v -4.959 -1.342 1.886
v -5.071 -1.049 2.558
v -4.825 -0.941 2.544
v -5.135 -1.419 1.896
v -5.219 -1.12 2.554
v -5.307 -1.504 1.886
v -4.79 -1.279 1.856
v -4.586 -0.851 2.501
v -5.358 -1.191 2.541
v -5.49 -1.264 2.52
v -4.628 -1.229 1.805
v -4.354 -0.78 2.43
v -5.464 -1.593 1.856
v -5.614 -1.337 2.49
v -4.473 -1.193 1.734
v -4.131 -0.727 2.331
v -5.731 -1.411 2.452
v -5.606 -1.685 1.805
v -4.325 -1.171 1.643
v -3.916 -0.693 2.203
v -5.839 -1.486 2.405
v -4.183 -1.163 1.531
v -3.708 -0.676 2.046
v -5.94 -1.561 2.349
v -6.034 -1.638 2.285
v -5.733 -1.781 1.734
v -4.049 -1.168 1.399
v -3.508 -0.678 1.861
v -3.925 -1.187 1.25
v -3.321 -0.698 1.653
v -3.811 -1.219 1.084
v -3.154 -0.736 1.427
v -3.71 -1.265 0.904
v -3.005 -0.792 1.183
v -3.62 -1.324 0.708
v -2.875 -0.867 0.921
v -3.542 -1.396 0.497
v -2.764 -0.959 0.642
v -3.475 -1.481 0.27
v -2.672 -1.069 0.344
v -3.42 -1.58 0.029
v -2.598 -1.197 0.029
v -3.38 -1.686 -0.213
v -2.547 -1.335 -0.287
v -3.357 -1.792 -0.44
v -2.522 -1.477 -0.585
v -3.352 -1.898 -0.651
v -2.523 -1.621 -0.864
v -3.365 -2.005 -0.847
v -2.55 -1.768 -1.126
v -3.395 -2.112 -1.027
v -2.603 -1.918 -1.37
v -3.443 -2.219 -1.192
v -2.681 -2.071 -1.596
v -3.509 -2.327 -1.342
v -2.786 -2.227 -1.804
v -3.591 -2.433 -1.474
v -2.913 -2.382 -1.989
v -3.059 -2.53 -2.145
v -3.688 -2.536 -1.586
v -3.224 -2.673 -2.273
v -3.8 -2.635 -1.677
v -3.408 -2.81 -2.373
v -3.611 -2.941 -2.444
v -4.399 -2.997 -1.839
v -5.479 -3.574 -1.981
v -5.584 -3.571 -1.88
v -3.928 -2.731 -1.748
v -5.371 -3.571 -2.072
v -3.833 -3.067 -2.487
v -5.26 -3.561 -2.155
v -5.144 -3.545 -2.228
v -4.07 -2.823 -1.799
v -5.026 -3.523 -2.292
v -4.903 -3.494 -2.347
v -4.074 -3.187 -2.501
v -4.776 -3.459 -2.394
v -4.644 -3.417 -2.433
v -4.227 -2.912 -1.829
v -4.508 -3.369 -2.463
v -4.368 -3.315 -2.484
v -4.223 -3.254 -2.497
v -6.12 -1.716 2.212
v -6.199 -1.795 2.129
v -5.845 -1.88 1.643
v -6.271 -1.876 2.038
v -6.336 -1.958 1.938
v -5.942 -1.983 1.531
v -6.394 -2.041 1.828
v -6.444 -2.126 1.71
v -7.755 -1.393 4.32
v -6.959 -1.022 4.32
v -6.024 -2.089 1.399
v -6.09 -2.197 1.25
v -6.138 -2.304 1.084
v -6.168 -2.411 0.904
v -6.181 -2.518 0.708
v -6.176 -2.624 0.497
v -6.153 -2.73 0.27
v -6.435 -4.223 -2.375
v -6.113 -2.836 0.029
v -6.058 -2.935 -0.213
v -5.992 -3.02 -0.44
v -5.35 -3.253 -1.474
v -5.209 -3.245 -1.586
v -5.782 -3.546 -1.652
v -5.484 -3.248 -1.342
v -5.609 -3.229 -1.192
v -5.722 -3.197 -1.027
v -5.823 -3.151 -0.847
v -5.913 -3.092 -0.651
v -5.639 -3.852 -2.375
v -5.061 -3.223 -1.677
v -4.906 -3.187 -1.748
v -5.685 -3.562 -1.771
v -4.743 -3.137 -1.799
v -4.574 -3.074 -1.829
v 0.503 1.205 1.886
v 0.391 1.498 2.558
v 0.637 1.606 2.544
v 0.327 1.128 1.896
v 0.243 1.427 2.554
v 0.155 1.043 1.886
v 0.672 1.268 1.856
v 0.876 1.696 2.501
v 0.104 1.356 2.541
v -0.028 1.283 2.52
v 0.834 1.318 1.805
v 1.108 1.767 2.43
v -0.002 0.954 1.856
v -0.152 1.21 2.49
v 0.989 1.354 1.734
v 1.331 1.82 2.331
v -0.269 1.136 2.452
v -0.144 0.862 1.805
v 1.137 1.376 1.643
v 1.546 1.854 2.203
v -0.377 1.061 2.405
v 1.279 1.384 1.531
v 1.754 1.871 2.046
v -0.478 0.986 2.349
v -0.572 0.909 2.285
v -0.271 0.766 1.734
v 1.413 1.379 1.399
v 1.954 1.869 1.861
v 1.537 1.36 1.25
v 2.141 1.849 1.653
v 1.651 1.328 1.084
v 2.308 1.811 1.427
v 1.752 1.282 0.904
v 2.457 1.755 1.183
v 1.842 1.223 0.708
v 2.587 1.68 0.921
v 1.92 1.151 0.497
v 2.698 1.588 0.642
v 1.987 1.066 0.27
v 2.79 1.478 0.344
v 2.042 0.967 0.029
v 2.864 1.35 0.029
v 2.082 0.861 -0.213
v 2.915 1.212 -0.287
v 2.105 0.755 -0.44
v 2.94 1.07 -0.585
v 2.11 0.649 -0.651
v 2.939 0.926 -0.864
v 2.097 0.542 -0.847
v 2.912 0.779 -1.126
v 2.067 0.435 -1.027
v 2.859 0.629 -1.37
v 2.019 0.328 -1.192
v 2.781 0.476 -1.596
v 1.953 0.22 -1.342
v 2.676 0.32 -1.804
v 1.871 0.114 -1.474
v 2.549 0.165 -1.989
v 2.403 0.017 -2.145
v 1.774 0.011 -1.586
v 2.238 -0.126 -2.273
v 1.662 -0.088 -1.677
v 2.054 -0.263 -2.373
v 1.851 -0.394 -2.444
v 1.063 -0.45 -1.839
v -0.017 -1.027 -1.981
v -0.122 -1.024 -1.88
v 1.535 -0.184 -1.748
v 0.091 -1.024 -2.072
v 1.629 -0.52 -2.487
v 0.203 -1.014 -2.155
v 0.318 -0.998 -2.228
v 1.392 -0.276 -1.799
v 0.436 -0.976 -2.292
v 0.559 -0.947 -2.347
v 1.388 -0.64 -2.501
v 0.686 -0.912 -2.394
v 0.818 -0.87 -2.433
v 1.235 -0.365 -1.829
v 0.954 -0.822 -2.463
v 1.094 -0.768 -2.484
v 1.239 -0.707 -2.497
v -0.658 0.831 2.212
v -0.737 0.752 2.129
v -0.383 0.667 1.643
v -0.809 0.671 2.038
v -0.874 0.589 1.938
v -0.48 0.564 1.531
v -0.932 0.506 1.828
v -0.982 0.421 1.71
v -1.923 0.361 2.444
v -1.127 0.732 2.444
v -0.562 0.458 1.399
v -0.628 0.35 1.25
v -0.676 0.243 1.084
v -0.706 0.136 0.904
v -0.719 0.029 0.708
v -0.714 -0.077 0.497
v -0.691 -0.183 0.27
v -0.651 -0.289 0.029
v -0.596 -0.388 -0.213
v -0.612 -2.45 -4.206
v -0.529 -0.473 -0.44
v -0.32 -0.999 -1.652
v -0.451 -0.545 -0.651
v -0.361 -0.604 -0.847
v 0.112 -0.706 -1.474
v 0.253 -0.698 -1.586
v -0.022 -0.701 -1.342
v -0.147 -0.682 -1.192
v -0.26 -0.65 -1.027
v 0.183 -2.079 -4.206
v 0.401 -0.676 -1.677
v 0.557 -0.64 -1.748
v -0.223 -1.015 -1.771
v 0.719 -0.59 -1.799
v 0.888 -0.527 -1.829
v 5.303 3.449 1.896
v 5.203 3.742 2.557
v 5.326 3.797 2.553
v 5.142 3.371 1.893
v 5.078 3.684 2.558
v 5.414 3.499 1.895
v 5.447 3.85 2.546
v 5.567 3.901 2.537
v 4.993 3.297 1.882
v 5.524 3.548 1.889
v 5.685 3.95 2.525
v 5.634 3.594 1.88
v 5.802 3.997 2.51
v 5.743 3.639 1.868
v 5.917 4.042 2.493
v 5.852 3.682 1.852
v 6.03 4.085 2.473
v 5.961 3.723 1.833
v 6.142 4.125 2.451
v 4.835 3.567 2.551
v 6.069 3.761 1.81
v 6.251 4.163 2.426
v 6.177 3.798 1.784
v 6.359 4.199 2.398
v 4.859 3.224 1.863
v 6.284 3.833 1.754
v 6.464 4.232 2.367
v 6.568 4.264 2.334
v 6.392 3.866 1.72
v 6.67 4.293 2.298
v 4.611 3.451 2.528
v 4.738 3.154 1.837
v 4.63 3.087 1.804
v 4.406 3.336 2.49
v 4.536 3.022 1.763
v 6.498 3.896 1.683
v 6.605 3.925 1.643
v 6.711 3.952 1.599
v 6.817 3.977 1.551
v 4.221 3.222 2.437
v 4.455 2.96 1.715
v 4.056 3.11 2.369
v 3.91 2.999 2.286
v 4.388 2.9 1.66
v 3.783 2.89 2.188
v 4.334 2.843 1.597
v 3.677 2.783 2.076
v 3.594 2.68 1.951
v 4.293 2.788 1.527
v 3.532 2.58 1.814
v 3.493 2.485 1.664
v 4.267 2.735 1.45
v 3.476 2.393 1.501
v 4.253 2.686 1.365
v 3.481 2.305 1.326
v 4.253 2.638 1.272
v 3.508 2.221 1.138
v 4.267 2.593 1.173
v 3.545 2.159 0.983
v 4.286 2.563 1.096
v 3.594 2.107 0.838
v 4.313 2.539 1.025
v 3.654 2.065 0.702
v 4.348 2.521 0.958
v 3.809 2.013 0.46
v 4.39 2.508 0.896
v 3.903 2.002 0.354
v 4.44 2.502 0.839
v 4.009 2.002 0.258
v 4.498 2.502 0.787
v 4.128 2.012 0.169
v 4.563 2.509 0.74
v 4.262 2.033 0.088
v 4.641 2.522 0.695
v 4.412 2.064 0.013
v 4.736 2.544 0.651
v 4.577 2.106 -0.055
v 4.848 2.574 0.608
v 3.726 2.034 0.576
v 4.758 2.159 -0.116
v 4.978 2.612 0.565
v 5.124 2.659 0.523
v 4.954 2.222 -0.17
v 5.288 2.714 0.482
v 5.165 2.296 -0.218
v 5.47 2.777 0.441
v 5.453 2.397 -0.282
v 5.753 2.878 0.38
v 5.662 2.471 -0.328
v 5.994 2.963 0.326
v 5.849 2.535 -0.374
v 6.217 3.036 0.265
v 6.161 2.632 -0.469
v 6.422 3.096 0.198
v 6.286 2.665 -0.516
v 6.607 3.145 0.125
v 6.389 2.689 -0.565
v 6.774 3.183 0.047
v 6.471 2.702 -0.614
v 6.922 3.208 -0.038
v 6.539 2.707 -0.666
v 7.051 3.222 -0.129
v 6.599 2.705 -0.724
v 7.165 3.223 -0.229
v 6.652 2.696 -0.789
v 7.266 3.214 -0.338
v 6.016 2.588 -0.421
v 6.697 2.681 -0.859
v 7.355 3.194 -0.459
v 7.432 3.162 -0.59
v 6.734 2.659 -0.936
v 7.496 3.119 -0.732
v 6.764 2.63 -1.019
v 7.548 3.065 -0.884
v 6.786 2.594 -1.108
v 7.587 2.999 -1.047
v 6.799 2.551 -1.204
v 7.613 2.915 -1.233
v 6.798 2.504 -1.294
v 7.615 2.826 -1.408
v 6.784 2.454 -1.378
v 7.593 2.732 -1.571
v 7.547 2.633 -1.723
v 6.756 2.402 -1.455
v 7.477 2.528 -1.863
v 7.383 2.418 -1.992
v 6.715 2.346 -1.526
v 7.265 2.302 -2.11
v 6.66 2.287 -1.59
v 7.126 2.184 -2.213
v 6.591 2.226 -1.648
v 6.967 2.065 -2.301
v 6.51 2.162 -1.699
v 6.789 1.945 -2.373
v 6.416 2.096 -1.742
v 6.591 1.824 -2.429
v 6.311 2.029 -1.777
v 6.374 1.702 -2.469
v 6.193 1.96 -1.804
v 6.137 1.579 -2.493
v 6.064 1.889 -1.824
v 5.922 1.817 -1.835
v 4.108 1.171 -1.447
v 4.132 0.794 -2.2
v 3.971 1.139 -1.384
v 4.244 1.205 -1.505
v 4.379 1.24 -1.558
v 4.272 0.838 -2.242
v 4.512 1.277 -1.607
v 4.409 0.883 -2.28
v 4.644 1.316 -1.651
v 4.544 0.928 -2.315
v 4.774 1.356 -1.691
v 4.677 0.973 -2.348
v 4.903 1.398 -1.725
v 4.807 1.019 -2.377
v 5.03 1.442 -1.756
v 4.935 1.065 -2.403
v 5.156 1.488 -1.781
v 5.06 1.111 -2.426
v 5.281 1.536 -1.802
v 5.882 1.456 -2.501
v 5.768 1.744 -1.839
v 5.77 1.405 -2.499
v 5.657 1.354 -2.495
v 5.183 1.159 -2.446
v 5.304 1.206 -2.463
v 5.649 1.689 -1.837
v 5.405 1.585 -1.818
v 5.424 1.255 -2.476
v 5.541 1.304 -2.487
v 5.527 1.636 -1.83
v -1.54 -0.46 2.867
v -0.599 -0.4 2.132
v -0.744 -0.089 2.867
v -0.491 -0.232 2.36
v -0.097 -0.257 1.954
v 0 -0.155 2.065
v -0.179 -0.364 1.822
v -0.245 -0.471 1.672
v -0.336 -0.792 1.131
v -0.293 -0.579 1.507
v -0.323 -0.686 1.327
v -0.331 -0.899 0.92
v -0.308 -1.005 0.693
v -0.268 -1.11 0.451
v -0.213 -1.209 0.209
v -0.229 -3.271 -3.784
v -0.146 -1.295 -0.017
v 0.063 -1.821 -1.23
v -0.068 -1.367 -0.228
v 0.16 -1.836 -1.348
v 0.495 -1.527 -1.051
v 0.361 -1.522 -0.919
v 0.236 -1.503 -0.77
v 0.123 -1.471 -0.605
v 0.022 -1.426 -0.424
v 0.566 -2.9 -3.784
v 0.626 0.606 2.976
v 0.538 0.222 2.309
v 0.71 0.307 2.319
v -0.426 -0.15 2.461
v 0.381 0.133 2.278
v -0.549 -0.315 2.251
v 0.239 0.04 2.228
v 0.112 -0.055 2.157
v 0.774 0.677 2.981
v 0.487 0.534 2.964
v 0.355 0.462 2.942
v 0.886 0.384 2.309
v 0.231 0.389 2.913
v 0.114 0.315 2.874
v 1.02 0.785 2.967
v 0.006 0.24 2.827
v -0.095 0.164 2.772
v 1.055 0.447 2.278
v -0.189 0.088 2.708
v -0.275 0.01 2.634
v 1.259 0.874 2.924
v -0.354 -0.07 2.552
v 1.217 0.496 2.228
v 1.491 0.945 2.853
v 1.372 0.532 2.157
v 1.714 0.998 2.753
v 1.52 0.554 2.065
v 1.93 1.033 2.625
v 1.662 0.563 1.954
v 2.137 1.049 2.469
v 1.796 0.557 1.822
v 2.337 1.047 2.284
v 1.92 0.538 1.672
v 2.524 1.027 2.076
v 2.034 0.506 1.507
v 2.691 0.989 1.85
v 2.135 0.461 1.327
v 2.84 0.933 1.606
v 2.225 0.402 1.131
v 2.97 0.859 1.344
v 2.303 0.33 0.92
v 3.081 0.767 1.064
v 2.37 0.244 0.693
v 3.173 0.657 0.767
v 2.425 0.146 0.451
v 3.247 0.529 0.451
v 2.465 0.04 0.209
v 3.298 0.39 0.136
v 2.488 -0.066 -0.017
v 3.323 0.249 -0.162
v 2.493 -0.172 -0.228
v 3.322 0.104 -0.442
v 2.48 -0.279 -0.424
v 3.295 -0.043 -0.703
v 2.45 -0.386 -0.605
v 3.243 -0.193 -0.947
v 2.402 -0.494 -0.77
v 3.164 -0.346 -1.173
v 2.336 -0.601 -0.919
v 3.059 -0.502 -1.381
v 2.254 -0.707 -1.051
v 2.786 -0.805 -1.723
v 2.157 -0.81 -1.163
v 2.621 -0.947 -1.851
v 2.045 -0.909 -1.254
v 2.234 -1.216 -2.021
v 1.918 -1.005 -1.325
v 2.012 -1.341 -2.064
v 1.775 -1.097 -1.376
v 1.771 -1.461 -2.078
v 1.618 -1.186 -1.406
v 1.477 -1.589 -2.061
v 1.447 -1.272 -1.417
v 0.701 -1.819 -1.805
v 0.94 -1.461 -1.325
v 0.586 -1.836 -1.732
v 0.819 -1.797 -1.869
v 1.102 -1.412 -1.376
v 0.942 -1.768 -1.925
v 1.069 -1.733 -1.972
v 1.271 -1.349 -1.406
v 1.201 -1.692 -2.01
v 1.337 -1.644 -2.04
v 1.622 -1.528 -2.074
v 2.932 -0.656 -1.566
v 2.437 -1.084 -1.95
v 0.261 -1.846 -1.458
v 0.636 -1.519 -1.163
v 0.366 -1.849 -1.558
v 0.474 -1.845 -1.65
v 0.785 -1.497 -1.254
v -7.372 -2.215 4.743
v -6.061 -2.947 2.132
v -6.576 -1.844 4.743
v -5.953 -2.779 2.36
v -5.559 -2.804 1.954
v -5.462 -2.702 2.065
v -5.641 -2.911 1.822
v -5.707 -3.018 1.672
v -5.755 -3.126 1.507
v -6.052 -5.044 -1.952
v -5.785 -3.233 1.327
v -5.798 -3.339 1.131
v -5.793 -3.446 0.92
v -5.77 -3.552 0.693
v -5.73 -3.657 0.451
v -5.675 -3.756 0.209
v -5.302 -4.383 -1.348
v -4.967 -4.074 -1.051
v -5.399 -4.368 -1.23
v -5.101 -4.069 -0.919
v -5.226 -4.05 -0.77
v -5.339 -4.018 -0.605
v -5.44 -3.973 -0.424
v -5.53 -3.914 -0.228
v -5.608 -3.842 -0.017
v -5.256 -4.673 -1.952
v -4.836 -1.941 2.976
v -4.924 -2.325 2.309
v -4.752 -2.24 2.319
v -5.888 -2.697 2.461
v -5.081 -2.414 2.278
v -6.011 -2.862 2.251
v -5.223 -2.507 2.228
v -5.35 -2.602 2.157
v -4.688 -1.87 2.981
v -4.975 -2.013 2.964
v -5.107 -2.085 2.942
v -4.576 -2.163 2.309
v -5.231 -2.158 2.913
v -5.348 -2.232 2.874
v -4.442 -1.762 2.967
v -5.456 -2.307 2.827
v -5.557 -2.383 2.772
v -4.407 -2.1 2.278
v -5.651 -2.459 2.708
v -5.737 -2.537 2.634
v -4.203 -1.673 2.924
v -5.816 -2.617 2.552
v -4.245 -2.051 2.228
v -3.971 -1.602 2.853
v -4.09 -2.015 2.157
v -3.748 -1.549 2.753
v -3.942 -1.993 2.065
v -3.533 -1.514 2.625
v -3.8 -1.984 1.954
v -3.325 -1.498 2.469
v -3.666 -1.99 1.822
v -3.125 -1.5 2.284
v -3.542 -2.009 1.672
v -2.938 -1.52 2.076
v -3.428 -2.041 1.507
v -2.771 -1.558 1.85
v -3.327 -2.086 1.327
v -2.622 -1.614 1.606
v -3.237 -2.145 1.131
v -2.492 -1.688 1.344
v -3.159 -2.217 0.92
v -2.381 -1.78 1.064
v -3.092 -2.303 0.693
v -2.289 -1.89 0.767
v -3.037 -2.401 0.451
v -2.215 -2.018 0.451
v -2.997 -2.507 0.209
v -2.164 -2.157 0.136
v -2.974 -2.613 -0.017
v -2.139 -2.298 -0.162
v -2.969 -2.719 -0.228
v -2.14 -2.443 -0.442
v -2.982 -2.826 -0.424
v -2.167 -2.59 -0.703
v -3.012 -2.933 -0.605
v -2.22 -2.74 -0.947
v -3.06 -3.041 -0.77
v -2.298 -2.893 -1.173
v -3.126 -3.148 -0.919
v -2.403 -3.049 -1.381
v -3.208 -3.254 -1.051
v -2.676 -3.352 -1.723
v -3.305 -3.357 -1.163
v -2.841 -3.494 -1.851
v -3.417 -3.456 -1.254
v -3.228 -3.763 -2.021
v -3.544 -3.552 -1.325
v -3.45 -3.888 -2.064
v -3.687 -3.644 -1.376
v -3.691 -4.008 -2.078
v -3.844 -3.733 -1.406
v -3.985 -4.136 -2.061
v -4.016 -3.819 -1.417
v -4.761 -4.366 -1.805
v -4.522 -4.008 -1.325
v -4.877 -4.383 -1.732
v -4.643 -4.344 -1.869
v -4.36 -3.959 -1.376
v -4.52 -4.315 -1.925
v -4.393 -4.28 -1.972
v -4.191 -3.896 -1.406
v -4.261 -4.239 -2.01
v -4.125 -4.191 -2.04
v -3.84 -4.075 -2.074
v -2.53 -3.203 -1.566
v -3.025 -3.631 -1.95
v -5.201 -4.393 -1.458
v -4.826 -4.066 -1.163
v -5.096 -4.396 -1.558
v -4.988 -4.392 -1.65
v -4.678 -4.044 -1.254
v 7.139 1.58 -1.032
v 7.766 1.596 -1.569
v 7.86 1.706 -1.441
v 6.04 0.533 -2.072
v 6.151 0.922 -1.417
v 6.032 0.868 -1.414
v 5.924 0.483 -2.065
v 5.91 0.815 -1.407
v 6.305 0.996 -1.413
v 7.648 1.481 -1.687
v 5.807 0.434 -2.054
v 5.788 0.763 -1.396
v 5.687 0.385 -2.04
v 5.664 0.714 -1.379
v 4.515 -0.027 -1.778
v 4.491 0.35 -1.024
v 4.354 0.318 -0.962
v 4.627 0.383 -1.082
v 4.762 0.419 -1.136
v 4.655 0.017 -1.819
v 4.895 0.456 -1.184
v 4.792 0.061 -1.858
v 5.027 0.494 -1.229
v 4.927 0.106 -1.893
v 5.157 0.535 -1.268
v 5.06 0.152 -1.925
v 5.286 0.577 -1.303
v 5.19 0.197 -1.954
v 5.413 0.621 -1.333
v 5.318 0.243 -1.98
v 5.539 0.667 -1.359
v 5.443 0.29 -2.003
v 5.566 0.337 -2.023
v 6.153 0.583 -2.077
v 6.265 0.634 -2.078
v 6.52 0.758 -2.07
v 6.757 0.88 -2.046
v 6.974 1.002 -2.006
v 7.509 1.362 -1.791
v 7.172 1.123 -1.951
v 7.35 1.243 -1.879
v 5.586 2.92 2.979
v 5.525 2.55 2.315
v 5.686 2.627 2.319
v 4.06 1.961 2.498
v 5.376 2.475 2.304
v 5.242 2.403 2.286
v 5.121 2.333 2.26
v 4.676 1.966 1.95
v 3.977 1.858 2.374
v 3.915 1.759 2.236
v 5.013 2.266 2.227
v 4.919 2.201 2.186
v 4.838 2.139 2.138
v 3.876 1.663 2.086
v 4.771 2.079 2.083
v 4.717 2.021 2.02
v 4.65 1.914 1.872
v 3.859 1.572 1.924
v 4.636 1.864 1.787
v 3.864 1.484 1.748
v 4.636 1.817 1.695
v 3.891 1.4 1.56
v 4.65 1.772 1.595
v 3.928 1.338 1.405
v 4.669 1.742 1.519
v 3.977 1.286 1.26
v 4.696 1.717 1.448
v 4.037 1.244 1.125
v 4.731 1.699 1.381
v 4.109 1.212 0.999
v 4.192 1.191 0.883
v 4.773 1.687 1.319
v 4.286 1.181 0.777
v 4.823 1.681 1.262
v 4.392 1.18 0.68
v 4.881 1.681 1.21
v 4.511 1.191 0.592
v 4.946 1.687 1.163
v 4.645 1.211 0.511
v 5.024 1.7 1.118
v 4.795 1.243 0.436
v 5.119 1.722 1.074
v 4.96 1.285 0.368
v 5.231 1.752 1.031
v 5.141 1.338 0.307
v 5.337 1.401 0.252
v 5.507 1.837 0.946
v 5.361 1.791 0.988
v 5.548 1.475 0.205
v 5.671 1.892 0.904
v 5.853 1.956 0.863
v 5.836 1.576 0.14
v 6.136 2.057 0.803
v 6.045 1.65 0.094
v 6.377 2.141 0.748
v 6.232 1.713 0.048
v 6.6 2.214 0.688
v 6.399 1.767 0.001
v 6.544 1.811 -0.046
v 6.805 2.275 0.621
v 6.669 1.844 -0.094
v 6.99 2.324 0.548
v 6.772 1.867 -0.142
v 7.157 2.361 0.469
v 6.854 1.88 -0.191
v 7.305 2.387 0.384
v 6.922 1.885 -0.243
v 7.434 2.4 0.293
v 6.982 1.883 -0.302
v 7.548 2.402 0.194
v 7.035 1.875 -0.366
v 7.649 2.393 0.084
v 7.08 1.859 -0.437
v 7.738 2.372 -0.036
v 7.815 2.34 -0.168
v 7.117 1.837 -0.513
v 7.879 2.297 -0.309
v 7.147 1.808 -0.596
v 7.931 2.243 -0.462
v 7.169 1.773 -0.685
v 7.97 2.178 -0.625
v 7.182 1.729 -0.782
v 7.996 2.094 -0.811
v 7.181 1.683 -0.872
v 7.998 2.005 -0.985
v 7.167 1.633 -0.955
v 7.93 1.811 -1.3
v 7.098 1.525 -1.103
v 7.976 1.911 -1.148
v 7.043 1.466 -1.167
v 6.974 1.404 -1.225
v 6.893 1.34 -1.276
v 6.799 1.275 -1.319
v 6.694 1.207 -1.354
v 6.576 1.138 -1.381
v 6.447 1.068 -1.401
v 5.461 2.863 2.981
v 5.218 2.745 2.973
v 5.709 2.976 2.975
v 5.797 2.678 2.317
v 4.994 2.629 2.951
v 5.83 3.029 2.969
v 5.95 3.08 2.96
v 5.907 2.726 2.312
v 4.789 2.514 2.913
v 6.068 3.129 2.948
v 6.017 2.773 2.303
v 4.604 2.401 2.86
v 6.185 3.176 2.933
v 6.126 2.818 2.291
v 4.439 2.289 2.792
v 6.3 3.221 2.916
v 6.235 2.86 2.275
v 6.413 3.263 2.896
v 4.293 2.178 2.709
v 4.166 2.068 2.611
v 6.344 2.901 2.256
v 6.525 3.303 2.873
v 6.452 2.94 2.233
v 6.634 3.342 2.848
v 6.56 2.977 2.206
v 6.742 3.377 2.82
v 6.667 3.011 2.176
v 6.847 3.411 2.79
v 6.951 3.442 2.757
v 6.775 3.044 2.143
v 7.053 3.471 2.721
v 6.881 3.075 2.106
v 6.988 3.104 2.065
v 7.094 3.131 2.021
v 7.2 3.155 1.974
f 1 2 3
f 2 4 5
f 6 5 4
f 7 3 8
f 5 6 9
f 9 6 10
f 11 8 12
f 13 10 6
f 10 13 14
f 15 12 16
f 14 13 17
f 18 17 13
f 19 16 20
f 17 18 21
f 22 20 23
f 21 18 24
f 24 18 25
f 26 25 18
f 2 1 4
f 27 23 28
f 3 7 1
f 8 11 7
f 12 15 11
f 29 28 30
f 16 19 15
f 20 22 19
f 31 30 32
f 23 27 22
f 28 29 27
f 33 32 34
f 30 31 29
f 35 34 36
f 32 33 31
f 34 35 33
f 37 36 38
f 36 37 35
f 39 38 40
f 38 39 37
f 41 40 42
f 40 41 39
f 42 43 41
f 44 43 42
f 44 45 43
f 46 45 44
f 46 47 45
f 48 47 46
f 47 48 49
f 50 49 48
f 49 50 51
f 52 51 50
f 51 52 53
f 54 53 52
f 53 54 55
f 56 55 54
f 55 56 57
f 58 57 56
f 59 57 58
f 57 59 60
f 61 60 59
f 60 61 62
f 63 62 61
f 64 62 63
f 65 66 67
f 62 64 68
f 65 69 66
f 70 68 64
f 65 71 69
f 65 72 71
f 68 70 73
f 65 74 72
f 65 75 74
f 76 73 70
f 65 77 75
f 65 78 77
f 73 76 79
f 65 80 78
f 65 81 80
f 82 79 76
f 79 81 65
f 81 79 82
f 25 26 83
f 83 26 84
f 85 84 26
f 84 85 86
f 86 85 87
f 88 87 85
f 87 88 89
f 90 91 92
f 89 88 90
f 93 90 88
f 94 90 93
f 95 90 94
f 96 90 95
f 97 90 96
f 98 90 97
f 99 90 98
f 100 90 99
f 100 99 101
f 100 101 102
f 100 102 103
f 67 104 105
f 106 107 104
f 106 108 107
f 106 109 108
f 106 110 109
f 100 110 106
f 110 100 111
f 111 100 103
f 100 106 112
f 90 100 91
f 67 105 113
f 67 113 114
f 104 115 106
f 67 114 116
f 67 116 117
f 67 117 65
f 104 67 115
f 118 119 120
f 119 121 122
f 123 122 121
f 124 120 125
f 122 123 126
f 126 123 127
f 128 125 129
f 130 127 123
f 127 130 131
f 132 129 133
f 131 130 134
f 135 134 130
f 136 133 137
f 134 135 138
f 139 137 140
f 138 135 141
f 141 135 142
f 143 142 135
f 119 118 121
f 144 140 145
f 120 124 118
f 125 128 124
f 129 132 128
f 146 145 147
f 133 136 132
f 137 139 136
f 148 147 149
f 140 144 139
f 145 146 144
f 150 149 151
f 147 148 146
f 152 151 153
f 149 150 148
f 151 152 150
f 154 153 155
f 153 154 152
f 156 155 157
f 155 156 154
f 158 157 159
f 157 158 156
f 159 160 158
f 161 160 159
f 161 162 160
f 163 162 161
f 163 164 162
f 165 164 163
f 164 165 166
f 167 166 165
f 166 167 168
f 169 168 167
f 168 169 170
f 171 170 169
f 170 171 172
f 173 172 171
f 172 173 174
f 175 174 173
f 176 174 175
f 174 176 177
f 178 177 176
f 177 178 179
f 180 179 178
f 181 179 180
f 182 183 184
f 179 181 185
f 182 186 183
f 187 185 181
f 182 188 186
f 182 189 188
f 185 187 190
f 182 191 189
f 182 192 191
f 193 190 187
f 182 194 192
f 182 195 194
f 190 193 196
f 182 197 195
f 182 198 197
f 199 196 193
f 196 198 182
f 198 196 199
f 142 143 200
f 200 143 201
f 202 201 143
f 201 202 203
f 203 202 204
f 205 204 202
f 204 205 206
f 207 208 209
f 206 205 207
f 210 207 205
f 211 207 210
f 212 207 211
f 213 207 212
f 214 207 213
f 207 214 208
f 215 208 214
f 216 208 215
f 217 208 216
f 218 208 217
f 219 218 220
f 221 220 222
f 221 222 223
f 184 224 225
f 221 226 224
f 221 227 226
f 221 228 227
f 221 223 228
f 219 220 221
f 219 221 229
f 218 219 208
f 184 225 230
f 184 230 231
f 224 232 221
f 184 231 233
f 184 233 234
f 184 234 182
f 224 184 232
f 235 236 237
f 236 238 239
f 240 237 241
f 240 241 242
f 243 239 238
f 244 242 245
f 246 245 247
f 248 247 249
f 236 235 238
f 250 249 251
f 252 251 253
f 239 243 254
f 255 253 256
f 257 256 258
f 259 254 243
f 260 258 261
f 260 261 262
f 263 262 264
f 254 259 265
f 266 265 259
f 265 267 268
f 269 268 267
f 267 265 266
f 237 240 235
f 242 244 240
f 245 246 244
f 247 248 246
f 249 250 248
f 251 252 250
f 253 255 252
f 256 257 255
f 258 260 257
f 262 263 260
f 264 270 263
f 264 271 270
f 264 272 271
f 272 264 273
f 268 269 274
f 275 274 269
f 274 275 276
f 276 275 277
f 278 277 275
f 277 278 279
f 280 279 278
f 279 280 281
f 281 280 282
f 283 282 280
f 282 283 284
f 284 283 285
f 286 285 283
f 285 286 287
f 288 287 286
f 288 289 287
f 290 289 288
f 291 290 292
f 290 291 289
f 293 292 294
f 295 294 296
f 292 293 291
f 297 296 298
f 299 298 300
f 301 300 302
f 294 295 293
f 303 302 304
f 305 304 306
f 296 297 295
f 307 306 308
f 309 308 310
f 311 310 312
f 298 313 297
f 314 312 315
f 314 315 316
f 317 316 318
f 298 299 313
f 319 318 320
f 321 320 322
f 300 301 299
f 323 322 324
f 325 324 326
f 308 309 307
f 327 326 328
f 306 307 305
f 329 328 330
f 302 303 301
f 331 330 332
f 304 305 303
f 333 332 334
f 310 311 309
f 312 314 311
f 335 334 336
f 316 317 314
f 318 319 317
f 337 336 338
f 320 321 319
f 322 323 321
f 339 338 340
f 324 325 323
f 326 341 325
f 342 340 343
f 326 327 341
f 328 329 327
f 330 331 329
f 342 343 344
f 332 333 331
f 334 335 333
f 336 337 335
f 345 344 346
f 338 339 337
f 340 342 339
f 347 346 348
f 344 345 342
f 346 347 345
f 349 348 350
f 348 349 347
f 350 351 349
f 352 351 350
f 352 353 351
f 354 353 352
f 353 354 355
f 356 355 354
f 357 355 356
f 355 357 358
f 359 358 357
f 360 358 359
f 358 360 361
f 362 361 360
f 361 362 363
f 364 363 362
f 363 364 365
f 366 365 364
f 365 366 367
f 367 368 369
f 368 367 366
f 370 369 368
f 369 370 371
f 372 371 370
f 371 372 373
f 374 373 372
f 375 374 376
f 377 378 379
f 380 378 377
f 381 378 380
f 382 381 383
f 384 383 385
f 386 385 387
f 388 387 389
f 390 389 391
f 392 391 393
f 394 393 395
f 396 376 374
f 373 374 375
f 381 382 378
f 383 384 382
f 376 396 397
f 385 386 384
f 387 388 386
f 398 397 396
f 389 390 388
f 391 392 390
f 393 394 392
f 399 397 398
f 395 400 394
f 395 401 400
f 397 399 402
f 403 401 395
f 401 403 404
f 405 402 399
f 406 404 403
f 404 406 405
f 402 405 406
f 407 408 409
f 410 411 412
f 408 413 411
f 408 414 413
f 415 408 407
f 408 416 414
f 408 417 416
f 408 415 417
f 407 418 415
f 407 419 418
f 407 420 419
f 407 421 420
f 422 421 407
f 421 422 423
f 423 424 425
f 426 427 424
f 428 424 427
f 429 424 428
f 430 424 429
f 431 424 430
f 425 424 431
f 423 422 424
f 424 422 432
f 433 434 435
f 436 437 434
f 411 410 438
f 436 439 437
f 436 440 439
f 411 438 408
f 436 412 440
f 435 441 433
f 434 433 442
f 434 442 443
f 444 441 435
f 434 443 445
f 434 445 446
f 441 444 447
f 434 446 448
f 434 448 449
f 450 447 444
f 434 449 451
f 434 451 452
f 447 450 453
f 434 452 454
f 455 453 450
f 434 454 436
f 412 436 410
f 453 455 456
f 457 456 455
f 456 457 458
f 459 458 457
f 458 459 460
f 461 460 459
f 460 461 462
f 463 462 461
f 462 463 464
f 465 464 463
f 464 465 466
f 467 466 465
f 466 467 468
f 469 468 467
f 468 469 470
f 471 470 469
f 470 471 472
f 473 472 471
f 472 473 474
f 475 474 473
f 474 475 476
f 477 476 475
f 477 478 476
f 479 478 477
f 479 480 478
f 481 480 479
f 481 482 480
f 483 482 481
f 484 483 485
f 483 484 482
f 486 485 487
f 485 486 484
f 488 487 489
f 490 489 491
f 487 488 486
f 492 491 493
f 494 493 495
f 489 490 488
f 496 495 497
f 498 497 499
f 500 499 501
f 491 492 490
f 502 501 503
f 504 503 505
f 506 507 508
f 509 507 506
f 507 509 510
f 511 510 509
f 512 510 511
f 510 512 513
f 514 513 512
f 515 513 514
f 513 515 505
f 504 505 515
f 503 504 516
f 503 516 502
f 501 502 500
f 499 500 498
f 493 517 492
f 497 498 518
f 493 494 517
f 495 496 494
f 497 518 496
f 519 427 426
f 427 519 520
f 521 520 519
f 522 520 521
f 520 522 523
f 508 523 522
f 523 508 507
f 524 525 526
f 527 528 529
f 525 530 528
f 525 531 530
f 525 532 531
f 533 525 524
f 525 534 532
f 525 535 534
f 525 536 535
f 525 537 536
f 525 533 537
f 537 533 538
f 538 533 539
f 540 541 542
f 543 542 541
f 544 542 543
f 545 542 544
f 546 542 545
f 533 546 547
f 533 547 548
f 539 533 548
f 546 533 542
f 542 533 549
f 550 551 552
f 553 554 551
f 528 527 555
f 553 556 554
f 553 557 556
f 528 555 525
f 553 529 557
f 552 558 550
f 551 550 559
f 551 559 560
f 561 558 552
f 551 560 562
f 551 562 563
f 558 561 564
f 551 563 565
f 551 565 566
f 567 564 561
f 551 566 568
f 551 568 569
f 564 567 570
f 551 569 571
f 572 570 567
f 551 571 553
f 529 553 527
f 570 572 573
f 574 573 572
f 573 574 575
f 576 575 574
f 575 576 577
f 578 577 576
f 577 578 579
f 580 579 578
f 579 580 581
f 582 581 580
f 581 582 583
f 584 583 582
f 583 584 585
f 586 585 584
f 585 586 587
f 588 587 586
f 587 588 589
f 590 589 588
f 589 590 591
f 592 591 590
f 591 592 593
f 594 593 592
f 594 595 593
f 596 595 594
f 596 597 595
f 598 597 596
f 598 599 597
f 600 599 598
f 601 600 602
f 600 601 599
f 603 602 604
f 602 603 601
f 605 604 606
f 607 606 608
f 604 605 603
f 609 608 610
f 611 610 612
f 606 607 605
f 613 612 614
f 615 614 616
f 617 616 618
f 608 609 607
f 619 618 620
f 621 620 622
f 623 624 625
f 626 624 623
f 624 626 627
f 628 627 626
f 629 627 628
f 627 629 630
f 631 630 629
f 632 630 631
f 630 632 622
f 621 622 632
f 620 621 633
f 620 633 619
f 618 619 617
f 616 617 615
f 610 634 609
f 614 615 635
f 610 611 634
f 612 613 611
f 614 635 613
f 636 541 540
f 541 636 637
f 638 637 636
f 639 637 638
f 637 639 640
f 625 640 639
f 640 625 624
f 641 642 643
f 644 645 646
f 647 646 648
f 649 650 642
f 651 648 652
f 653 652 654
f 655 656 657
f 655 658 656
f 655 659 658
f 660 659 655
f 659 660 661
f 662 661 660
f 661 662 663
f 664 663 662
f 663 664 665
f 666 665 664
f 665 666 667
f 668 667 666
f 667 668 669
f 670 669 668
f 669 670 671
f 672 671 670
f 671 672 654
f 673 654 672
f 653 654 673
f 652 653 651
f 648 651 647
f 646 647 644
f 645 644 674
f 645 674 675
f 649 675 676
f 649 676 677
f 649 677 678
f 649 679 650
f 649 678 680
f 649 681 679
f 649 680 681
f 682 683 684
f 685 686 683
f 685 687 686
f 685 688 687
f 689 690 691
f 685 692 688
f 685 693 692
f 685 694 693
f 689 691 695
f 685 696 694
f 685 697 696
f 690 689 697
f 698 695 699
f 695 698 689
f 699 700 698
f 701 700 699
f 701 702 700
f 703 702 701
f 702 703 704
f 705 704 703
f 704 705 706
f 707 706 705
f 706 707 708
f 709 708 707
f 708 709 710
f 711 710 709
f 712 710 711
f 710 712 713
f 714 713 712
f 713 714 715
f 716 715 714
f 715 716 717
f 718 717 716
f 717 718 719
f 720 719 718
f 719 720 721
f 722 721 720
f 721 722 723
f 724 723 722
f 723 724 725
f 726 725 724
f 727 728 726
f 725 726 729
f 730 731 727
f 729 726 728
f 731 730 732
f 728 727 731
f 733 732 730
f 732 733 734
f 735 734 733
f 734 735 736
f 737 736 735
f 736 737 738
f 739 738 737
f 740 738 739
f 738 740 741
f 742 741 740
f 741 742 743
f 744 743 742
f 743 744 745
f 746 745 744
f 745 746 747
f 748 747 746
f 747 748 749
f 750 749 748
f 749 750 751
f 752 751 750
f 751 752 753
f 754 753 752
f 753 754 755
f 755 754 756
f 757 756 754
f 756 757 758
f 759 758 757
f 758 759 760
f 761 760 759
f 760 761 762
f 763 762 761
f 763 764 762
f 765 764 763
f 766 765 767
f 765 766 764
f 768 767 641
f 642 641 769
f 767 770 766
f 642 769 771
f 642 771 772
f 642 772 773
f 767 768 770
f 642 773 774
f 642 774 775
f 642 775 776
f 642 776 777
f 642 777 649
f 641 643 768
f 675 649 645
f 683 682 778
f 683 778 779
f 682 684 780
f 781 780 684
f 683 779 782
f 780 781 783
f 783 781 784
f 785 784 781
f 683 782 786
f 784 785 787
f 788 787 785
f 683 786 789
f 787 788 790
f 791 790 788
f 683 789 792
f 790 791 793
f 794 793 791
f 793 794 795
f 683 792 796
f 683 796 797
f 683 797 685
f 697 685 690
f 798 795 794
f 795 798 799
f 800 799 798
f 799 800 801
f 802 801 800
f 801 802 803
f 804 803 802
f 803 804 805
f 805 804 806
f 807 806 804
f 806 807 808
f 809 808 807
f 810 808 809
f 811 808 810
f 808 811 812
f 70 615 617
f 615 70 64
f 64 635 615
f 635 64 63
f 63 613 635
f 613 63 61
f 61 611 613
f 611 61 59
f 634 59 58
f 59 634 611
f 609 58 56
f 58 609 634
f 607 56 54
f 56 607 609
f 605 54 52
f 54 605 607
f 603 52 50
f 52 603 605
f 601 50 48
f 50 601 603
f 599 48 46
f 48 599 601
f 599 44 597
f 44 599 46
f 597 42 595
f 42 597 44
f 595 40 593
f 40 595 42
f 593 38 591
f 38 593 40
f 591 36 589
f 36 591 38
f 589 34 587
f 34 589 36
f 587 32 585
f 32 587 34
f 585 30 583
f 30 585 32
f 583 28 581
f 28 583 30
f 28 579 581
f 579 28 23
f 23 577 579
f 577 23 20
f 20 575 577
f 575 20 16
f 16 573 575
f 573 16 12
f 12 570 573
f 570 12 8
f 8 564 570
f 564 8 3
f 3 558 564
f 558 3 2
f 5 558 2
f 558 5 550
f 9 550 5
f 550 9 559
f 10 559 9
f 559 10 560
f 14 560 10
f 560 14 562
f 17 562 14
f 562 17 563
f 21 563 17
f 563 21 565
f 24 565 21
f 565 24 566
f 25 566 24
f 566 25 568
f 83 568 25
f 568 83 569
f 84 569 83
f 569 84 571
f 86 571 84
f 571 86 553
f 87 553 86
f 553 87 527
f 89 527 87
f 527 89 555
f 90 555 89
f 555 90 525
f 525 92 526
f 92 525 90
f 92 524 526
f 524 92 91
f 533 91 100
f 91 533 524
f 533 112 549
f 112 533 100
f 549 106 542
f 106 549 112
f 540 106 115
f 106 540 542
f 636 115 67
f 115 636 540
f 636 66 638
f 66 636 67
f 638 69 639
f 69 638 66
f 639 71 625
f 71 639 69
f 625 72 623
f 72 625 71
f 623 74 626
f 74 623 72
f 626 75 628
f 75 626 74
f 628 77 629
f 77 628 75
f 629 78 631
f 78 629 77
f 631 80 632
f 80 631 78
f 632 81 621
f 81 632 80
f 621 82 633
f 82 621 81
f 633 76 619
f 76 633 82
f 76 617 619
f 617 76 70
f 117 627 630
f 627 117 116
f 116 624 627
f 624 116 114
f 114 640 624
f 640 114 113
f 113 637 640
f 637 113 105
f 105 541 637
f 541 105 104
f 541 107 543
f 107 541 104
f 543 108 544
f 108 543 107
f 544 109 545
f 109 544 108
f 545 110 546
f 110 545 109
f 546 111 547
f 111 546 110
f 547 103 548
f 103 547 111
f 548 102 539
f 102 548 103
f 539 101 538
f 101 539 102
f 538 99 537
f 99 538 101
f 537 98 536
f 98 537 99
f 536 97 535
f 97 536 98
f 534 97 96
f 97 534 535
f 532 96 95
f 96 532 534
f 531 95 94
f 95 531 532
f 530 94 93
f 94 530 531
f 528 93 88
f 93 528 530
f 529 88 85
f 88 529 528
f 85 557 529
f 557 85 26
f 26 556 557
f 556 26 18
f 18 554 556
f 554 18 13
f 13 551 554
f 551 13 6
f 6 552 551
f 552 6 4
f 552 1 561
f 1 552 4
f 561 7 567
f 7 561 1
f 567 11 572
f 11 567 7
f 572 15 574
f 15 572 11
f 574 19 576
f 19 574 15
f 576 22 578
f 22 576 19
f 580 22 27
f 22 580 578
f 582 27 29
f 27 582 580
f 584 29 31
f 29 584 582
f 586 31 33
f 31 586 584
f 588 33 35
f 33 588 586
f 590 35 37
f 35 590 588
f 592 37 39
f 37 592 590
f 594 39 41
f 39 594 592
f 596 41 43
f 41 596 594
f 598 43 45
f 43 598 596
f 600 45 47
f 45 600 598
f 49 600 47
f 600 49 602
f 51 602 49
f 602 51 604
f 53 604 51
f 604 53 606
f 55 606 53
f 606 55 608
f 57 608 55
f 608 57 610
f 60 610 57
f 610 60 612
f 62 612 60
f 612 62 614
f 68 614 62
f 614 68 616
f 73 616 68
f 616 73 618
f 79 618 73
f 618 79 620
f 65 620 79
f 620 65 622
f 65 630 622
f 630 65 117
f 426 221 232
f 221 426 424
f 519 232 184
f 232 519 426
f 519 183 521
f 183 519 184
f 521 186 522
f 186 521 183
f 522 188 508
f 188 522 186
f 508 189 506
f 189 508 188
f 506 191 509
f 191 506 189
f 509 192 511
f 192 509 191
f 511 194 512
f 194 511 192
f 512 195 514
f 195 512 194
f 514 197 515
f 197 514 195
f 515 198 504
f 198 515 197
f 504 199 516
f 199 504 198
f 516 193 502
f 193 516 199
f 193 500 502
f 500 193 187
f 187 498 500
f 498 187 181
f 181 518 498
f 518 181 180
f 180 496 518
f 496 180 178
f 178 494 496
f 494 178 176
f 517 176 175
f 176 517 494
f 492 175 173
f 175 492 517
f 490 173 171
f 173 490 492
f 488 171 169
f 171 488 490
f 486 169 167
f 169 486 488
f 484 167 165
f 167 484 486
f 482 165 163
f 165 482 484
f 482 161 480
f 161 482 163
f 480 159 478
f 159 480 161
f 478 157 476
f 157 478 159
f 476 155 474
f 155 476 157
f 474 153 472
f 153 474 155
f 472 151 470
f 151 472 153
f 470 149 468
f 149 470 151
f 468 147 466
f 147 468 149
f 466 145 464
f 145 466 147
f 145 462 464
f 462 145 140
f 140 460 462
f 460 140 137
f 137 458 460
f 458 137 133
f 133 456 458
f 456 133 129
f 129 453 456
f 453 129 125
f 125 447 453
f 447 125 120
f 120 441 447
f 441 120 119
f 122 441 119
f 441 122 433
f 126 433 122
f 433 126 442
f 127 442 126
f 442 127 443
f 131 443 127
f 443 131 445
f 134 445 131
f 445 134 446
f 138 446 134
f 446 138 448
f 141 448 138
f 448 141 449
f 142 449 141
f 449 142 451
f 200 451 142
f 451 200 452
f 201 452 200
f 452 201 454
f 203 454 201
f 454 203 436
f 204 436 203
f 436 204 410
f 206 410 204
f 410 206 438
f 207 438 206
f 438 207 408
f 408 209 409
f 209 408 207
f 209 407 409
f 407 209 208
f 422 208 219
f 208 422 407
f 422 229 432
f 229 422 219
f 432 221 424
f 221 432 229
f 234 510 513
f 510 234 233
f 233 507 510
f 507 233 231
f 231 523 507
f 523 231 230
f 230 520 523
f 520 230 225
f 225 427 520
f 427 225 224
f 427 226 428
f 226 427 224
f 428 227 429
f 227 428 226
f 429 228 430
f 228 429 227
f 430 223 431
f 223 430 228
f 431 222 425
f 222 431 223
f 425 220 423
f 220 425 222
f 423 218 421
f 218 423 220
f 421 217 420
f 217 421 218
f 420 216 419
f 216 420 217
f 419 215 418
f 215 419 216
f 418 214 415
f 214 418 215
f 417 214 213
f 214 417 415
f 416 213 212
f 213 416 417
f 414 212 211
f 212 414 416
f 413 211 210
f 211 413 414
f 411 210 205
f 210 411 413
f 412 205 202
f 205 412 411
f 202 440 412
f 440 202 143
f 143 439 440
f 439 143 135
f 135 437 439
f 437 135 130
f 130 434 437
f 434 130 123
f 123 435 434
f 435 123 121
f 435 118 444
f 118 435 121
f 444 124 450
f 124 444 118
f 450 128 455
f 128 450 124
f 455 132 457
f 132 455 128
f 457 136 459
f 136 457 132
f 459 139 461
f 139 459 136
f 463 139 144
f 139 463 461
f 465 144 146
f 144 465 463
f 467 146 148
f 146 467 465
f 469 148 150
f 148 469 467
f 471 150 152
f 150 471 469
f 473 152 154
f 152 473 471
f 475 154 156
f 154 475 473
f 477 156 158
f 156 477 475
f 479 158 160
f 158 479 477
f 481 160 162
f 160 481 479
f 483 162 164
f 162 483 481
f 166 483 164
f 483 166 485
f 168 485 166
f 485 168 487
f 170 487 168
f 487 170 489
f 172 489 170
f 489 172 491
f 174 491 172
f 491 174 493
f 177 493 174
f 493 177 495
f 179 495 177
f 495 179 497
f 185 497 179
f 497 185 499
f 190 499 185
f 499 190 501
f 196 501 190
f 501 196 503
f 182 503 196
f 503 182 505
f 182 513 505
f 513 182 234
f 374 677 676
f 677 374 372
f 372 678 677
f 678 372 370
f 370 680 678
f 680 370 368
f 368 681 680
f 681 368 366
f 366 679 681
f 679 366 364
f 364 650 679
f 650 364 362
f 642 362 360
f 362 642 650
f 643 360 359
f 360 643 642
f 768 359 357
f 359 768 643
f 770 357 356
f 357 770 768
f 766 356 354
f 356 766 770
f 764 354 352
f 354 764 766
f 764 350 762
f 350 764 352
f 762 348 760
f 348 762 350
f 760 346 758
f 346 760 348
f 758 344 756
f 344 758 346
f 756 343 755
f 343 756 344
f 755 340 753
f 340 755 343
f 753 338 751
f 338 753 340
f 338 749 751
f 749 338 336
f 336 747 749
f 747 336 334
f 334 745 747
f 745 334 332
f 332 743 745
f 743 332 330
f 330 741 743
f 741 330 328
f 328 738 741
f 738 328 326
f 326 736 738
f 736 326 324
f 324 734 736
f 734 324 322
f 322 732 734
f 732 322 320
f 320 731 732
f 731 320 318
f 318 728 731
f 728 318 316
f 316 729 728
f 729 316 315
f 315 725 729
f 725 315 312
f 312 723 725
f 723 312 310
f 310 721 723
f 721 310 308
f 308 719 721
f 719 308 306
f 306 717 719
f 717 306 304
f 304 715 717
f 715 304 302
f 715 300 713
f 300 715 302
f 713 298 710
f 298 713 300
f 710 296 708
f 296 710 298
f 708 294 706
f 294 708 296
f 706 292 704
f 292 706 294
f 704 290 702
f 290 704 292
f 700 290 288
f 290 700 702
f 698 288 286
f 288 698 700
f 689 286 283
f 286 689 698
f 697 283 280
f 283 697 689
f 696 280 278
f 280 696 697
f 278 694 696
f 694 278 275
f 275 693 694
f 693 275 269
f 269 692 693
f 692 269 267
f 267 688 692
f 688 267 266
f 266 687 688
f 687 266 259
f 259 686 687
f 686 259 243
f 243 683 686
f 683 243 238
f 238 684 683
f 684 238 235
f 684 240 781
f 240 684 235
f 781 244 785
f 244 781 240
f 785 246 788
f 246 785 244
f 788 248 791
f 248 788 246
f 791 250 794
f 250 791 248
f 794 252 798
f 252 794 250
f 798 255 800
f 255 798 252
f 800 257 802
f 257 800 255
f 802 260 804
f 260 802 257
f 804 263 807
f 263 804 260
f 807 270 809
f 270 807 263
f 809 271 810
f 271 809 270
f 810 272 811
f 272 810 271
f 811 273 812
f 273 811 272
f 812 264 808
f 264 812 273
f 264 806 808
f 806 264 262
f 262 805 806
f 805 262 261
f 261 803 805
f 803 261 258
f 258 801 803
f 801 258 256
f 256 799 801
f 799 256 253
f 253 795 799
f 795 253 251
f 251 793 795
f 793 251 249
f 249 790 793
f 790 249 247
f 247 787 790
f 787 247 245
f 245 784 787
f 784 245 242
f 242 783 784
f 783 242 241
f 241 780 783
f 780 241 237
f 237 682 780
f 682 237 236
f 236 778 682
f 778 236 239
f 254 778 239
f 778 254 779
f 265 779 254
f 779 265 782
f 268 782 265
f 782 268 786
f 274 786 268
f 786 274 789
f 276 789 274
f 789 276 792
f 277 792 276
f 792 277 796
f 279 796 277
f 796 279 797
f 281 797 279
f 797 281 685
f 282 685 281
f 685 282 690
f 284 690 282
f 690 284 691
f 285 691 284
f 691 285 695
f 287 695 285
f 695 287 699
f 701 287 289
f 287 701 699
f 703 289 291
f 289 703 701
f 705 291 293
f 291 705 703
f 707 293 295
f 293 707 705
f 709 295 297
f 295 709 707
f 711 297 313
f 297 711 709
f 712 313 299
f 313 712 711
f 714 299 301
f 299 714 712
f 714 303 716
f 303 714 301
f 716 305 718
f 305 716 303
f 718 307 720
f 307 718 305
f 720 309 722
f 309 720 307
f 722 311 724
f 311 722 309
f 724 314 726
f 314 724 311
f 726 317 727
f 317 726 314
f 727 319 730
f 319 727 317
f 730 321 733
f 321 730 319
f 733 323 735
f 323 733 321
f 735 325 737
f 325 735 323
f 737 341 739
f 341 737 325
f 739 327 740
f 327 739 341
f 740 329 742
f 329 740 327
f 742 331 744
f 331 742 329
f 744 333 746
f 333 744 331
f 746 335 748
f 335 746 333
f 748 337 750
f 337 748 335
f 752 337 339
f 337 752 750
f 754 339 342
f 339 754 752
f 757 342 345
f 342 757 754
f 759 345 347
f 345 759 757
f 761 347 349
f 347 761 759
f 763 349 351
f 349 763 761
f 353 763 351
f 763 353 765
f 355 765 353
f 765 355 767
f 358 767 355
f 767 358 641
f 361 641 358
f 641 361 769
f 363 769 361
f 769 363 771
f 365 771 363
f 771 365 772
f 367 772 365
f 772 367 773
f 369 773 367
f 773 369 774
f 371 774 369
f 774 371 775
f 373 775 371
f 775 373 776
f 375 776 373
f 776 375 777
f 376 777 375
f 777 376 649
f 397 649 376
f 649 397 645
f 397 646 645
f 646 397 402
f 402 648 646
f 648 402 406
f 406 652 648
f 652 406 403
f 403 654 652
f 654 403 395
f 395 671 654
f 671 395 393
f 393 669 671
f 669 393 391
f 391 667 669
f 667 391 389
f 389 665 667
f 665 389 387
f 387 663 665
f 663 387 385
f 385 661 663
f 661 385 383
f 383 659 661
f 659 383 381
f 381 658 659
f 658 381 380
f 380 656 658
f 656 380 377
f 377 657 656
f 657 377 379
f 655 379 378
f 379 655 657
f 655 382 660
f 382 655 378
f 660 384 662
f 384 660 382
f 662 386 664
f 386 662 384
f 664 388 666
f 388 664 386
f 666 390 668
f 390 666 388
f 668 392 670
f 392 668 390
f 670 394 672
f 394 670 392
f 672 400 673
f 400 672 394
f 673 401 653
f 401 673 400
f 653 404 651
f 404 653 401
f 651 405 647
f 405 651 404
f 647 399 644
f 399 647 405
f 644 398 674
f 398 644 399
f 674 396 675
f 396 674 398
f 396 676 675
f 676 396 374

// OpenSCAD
$fn = 50;

difference() {
	union() {
		translate(v = [0, 0, 0]) {
			rotate(a = [65, 0, 25]) {
				difference() {
					union() {
						linear_extrude(height = 1) {
							text(font = "Candara:Light", halign = "center", size = 7, text = "bps", valign = "center");
						}
					}
					union();
				}
			}
		}
	}
	union();
}
